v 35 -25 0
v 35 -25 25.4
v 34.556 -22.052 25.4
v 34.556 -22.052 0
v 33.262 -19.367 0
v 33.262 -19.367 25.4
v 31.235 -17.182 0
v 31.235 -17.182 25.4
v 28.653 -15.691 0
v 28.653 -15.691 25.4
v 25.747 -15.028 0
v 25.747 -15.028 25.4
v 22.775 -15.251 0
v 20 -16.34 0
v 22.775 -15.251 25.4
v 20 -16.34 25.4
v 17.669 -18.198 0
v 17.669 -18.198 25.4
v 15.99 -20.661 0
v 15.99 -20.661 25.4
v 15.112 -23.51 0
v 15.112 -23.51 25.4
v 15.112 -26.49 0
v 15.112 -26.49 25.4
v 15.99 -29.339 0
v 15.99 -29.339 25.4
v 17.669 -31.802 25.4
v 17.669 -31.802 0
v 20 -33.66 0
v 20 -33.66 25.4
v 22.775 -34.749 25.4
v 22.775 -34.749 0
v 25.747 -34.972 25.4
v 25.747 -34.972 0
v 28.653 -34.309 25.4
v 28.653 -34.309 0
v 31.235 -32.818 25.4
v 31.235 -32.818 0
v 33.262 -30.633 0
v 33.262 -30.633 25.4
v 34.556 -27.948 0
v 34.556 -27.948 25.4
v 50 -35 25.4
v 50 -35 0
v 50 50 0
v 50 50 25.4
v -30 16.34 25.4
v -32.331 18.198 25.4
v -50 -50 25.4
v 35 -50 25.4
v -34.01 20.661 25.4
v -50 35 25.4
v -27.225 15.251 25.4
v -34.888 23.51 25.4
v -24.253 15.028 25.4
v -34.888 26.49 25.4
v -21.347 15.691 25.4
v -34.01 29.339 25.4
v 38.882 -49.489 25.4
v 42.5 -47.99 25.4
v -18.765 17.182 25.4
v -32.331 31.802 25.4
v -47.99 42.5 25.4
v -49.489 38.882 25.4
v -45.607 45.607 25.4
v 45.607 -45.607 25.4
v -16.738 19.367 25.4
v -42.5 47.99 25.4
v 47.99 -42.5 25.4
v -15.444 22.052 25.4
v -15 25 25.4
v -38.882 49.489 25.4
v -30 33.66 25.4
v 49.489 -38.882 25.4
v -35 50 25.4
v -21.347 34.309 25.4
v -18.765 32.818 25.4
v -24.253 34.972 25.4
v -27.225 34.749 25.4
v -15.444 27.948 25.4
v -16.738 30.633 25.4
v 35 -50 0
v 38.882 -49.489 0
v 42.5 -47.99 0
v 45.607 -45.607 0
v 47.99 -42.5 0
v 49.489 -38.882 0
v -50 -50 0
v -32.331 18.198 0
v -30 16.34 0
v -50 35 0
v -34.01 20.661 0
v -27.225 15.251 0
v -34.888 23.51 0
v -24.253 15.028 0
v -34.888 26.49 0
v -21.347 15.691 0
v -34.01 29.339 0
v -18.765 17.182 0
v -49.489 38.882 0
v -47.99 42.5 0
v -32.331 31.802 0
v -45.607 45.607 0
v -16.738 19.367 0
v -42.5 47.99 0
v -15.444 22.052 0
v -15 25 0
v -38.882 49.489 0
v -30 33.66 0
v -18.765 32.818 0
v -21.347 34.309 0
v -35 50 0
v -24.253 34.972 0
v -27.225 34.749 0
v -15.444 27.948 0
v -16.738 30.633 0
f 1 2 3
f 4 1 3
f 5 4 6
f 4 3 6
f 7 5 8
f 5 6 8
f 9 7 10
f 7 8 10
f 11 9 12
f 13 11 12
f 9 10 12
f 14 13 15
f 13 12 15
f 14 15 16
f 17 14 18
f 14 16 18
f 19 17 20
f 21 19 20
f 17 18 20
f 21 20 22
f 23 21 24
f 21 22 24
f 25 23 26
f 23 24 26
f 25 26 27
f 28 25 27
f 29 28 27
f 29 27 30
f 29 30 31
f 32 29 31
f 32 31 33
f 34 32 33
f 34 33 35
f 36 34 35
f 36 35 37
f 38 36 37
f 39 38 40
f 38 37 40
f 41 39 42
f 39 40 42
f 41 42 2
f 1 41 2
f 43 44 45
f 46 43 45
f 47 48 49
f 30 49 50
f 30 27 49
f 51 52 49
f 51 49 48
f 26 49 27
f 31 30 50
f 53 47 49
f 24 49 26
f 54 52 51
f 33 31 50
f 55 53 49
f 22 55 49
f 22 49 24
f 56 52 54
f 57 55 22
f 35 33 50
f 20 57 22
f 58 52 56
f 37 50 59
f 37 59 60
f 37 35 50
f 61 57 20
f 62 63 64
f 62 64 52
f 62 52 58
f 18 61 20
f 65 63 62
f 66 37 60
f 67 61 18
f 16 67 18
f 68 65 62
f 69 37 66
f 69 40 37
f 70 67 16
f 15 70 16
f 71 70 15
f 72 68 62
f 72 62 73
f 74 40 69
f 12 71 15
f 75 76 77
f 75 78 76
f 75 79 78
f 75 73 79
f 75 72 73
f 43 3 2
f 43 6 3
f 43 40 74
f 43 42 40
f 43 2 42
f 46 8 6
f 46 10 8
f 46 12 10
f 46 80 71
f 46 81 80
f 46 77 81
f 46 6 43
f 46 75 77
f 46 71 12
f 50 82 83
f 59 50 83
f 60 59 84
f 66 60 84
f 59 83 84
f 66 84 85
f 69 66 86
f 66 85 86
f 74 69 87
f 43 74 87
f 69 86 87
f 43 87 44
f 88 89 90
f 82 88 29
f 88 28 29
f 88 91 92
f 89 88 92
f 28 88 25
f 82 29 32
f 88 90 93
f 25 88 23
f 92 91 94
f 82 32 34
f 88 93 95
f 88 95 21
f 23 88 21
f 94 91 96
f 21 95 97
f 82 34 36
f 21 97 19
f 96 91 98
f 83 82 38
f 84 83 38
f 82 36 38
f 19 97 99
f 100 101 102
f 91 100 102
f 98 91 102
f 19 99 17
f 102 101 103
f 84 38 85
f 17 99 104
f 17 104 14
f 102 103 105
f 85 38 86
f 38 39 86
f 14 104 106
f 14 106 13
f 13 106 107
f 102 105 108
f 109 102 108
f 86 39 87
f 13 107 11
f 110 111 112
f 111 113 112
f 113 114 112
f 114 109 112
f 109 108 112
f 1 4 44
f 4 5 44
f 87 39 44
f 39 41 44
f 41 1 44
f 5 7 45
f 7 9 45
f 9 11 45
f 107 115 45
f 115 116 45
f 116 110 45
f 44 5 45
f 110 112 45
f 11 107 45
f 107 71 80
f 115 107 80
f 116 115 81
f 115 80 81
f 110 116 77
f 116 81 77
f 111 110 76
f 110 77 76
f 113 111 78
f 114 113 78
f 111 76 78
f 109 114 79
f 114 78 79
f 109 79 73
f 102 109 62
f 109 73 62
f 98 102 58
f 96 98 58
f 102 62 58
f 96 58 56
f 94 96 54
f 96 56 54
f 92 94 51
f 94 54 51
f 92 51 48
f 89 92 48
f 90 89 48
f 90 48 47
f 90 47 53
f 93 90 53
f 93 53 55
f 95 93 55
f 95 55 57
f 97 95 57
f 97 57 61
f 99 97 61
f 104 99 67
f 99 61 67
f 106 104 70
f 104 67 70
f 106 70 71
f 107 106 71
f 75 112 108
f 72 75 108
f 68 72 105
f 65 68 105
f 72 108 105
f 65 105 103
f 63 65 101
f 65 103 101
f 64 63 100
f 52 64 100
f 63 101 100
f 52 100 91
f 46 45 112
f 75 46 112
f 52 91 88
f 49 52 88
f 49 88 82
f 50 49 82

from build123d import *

# Parameters (mm, degrees)
F1_DEPTH = 25.4
F2_R     = 10
F3_DEPTH = 25.4


with BuildPart() as f1:
    # F0 (on Top) → F1 (new body)
    with BuildSketch(Plane.XY):
        with BuildLine():
            Line((50, 50), (-35, 50))
            ThreePointArc((-35, 50), (-45.606602, 45.606602), (-50, 35))
            Line((-50, 35), (-50, -50))
            Line((-50, -50), (35, -50))
            ThreePointArc((35, -50), (45.606602, -45.606602), (50, -35))
            Line((50, -35), (50, 50))
        make_face()
    extrude(amount=F1_DEPTH)

    # F2 (on face) → F3 (cut, through all)
    with BuildSketch(Plane.XY.offset(25.4)):
        with Locations((-25, 25)):
            Circle(F2_R)
        with Locations((25, -25)):
            Circle(F2_R)
    extrude(amount=-F3_DEPTH, mode=Mode.SUBTRACT)


solid = f1.part
